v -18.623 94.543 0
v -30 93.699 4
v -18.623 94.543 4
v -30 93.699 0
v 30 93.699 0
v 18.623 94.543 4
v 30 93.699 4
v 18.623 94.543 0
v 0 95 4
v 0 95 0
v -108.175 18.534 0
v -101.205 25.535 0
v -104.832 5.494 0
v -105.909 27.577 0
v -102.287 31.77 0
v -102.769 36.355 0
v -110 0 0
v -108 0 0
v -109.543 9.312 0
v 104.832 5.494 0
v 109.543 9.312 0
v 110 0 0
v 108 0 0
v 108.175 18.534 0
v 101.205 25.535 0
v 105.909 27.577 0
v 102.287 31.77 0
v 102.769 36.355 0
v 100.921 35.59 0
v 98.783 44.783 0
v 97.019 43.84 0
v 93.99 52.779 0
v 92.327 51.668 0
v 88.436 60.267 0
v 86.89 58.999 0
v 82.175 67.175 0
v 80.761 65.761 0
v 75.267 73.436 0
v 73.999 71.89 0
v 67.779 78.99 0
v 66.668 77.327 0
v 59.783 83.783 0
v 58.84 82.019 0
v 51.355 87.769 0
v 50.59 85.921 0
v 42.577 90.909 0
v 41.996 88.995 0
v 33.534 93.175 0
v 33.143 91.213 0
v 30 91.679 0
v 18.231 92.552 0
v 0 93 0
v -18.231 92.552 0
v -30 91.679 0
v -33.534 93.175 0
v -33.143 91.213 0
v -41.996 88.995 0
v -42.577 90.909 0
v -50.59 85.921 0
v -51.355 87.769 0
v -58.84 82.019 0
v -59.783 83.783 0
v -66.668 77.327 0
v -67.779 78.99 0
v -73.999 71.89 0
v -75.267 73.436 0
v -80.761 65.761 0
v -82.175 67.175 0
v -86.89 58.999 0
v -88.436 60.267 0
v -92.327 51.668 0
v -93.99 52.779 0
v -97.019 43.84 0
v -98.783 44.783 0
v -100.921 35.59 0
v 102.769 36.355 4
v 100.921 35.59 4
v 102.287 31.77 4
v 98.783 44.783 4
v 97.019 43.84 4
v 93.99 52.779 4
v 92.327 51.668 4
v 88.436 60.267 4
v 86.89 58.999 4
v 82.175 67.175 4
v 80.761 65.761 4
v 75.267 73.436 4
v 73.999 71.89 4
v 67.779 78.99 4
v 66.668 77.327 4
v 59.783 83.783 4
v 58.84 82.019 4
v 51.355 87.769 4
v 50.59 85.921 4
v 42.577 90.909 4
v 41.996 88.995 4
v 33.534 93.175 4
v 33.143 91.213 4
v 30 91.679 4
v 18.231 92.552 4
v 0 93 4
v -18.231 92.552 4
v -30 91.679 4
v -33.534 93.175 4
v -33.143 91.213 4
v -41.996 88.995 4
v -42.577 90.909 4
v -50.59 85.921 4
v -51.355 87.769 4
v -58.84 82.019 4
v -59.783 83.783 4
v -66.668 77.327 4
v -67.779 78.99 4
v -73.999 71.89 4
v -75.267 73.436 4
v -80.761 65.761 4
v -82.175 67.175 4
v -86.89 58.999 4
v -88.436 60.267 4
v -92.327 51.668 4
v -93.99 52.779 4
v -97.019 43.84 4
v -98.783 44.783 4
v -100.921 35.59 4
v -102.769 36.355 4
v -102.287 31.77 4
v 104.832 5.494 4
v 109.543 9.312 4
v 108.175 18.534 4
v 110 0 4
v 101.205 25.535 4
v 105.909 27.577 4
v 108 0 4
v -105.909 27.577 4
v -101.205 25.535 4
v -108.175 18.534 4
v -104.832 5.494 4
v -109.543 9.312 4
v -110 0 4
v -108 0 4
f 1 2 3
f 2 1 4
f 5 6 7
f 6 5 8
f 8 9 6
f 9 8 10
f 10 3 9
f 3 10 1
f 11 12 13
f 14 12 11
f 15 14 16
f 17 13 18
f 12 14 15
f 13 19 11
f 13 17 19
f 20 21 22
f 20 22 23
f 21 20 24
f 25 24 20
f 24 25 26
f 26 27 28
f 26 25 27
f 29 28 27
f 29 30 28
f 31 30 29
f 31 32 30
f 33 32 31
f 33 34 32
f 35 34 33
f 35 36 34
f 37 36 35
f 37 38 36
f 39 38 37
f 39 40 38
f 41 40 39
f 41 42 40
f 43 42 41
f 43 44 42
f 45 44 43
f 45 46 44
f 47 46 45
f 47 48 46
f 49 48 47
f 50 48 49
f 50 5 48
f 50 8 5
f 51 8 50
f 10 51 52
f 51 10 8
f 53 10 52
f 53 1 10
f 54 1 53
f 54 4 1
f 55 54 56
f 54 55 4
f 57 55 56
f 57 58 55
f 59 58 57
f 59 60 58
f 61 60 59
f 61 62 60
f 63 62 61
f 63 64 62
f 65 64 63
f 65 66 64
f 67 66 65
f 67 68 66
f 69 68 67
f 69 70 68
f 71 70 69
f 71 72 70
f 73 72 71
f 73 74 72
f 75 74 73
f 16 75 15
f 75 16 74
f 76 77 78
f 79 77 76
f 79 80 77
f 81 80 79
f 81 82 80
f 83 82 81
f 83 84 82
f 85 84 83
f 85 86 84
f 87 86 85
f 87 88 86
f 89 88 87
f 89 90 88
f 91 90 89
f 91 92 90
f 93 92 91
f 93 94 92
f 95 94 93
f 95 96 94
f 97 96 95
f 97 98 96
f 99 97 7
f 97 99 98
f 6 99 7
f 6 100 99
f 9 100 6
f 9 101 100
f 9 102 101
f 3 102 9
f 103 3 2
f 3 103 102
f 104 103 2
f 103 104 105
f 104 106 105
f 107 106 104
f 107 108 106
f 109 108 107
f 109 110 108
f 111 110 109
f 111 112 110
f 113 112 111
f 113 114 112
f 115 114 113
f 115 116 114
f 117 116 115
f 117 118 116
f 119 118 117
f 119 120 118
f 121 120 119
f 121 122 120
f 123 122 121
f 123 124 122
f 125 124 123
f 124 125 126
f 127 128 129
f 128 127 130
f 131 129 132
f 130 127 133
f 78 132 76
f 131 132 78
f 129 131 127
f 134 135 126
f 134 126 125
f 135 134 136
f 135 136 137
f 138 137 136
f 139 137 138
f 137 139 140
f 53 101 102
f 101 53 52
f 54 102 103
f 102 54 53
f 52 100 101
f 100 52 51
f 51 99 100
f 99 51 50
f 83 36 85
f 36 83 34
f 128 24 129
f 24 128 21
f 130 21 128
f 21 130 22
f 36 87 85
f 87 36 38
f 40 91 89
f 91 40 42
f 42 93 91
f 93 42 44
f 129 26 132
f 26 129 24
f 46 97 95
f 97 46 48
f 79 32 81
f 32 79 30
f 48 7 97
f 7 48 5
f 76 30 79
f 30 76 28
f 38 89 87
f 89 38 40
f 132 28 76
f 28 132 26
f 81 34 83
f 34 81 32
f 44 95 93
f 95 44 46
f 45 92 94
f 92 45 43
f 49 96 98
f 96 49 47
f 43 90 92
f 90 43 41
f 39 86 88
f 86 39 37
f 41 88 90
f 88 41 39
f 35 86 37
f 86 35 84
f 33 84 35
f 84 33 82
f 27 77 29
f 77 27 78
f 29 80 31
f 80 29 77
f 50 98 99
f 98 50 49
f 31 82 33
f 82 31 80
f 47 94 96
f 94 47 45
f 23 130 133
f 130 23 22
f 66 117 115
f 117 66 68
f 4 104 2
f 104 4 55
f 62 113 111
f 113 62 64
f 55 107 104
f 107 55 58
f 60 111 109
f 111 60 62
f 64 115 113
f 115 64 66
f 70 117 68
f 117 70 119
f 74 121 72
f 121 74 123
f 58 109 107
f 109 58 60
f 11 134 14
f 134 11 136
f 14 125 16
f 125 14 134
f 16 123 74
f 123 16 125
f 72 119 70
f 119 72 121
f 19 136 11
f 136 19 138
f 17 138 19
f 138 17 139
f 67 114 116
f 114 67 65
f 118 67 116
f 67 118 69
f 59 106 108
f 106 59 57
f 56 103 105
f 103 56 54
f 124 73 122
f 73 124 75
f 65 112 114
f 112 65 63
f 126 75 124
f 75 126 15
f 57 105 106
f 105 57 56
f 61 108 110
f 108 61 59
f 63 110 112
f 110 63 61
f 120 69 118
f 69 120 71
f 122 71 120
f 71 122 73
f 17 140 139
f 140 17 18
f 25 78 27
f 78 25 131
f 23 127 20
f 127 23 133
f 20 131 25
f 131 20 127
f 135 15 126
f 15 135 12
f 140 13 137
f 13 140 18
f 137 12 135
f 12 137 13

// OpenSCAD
$fn=64;

bitSize=30;
targetBitSize=60;
s=targetBitSize/bitSize;
t=4;
ar=95;

scale([s,1,1]) intersection() {
  arch();
  translate([-bitSize/2,0,-1]) cube([bitSize,100,200]);
}

translate([-bitSize/2+targetBitSize/2,0,0]) intersection() {
  arch();
  translate([bitSize/2,0,-1]) cube([200,100,200]);
}

translate([bitSize/2-targetBitSize/2,0,0]) intersection() {
  arch();
  translate([-200-bitSize/2,0,-1]) cube([200,100,200]);
}

translate([-bitSize/2+targetBitSize/2,0,0]) nub();
mirror([1,0,0]) translate([-bitSize/2+targetBitSize/2,0,0]) nub();

module nub() {
  difference() {
    hull() {
      difference() {
        cylinder(r=ar-2+0.1,h=t);
        translate([0,0,-0.1]) cylinder(r=ar-2,h=t+0.2);
        translate([-100,-200,-0.1]) cube([200,200,t+0.2]);
        rotate([0,0,20]) translate([-100,0,-0.1]) cube([200,200,t+0.2]);
      }
      rotate([0,0,3.5]) difference() {
        cylinder(r=ar-5+0.1,h=t);
        translate([0,0,-0.1]) cylinder(r=ar-5,h=t+0.2);
        translate([-100,-200,-0.1]) cube([200,200,t+0.2]);
        rotate([0,0,13]) translate([-100,0,-0.1]) cube([200,200,t+0.2]);
      }
    }
    translate([0,0,-0.1]) cylinder(r=85,h=t+0.2);
  }
}

module arch() {
  intersection() {
    translate([-ar,0,0]) cube([ar*2,ar,t]);
    difference() {
      cylinder(r=ar,h=t);
      translate([0,0,-1]) cylinder(r=ar-2,h=t+2);
    }
  }
}
